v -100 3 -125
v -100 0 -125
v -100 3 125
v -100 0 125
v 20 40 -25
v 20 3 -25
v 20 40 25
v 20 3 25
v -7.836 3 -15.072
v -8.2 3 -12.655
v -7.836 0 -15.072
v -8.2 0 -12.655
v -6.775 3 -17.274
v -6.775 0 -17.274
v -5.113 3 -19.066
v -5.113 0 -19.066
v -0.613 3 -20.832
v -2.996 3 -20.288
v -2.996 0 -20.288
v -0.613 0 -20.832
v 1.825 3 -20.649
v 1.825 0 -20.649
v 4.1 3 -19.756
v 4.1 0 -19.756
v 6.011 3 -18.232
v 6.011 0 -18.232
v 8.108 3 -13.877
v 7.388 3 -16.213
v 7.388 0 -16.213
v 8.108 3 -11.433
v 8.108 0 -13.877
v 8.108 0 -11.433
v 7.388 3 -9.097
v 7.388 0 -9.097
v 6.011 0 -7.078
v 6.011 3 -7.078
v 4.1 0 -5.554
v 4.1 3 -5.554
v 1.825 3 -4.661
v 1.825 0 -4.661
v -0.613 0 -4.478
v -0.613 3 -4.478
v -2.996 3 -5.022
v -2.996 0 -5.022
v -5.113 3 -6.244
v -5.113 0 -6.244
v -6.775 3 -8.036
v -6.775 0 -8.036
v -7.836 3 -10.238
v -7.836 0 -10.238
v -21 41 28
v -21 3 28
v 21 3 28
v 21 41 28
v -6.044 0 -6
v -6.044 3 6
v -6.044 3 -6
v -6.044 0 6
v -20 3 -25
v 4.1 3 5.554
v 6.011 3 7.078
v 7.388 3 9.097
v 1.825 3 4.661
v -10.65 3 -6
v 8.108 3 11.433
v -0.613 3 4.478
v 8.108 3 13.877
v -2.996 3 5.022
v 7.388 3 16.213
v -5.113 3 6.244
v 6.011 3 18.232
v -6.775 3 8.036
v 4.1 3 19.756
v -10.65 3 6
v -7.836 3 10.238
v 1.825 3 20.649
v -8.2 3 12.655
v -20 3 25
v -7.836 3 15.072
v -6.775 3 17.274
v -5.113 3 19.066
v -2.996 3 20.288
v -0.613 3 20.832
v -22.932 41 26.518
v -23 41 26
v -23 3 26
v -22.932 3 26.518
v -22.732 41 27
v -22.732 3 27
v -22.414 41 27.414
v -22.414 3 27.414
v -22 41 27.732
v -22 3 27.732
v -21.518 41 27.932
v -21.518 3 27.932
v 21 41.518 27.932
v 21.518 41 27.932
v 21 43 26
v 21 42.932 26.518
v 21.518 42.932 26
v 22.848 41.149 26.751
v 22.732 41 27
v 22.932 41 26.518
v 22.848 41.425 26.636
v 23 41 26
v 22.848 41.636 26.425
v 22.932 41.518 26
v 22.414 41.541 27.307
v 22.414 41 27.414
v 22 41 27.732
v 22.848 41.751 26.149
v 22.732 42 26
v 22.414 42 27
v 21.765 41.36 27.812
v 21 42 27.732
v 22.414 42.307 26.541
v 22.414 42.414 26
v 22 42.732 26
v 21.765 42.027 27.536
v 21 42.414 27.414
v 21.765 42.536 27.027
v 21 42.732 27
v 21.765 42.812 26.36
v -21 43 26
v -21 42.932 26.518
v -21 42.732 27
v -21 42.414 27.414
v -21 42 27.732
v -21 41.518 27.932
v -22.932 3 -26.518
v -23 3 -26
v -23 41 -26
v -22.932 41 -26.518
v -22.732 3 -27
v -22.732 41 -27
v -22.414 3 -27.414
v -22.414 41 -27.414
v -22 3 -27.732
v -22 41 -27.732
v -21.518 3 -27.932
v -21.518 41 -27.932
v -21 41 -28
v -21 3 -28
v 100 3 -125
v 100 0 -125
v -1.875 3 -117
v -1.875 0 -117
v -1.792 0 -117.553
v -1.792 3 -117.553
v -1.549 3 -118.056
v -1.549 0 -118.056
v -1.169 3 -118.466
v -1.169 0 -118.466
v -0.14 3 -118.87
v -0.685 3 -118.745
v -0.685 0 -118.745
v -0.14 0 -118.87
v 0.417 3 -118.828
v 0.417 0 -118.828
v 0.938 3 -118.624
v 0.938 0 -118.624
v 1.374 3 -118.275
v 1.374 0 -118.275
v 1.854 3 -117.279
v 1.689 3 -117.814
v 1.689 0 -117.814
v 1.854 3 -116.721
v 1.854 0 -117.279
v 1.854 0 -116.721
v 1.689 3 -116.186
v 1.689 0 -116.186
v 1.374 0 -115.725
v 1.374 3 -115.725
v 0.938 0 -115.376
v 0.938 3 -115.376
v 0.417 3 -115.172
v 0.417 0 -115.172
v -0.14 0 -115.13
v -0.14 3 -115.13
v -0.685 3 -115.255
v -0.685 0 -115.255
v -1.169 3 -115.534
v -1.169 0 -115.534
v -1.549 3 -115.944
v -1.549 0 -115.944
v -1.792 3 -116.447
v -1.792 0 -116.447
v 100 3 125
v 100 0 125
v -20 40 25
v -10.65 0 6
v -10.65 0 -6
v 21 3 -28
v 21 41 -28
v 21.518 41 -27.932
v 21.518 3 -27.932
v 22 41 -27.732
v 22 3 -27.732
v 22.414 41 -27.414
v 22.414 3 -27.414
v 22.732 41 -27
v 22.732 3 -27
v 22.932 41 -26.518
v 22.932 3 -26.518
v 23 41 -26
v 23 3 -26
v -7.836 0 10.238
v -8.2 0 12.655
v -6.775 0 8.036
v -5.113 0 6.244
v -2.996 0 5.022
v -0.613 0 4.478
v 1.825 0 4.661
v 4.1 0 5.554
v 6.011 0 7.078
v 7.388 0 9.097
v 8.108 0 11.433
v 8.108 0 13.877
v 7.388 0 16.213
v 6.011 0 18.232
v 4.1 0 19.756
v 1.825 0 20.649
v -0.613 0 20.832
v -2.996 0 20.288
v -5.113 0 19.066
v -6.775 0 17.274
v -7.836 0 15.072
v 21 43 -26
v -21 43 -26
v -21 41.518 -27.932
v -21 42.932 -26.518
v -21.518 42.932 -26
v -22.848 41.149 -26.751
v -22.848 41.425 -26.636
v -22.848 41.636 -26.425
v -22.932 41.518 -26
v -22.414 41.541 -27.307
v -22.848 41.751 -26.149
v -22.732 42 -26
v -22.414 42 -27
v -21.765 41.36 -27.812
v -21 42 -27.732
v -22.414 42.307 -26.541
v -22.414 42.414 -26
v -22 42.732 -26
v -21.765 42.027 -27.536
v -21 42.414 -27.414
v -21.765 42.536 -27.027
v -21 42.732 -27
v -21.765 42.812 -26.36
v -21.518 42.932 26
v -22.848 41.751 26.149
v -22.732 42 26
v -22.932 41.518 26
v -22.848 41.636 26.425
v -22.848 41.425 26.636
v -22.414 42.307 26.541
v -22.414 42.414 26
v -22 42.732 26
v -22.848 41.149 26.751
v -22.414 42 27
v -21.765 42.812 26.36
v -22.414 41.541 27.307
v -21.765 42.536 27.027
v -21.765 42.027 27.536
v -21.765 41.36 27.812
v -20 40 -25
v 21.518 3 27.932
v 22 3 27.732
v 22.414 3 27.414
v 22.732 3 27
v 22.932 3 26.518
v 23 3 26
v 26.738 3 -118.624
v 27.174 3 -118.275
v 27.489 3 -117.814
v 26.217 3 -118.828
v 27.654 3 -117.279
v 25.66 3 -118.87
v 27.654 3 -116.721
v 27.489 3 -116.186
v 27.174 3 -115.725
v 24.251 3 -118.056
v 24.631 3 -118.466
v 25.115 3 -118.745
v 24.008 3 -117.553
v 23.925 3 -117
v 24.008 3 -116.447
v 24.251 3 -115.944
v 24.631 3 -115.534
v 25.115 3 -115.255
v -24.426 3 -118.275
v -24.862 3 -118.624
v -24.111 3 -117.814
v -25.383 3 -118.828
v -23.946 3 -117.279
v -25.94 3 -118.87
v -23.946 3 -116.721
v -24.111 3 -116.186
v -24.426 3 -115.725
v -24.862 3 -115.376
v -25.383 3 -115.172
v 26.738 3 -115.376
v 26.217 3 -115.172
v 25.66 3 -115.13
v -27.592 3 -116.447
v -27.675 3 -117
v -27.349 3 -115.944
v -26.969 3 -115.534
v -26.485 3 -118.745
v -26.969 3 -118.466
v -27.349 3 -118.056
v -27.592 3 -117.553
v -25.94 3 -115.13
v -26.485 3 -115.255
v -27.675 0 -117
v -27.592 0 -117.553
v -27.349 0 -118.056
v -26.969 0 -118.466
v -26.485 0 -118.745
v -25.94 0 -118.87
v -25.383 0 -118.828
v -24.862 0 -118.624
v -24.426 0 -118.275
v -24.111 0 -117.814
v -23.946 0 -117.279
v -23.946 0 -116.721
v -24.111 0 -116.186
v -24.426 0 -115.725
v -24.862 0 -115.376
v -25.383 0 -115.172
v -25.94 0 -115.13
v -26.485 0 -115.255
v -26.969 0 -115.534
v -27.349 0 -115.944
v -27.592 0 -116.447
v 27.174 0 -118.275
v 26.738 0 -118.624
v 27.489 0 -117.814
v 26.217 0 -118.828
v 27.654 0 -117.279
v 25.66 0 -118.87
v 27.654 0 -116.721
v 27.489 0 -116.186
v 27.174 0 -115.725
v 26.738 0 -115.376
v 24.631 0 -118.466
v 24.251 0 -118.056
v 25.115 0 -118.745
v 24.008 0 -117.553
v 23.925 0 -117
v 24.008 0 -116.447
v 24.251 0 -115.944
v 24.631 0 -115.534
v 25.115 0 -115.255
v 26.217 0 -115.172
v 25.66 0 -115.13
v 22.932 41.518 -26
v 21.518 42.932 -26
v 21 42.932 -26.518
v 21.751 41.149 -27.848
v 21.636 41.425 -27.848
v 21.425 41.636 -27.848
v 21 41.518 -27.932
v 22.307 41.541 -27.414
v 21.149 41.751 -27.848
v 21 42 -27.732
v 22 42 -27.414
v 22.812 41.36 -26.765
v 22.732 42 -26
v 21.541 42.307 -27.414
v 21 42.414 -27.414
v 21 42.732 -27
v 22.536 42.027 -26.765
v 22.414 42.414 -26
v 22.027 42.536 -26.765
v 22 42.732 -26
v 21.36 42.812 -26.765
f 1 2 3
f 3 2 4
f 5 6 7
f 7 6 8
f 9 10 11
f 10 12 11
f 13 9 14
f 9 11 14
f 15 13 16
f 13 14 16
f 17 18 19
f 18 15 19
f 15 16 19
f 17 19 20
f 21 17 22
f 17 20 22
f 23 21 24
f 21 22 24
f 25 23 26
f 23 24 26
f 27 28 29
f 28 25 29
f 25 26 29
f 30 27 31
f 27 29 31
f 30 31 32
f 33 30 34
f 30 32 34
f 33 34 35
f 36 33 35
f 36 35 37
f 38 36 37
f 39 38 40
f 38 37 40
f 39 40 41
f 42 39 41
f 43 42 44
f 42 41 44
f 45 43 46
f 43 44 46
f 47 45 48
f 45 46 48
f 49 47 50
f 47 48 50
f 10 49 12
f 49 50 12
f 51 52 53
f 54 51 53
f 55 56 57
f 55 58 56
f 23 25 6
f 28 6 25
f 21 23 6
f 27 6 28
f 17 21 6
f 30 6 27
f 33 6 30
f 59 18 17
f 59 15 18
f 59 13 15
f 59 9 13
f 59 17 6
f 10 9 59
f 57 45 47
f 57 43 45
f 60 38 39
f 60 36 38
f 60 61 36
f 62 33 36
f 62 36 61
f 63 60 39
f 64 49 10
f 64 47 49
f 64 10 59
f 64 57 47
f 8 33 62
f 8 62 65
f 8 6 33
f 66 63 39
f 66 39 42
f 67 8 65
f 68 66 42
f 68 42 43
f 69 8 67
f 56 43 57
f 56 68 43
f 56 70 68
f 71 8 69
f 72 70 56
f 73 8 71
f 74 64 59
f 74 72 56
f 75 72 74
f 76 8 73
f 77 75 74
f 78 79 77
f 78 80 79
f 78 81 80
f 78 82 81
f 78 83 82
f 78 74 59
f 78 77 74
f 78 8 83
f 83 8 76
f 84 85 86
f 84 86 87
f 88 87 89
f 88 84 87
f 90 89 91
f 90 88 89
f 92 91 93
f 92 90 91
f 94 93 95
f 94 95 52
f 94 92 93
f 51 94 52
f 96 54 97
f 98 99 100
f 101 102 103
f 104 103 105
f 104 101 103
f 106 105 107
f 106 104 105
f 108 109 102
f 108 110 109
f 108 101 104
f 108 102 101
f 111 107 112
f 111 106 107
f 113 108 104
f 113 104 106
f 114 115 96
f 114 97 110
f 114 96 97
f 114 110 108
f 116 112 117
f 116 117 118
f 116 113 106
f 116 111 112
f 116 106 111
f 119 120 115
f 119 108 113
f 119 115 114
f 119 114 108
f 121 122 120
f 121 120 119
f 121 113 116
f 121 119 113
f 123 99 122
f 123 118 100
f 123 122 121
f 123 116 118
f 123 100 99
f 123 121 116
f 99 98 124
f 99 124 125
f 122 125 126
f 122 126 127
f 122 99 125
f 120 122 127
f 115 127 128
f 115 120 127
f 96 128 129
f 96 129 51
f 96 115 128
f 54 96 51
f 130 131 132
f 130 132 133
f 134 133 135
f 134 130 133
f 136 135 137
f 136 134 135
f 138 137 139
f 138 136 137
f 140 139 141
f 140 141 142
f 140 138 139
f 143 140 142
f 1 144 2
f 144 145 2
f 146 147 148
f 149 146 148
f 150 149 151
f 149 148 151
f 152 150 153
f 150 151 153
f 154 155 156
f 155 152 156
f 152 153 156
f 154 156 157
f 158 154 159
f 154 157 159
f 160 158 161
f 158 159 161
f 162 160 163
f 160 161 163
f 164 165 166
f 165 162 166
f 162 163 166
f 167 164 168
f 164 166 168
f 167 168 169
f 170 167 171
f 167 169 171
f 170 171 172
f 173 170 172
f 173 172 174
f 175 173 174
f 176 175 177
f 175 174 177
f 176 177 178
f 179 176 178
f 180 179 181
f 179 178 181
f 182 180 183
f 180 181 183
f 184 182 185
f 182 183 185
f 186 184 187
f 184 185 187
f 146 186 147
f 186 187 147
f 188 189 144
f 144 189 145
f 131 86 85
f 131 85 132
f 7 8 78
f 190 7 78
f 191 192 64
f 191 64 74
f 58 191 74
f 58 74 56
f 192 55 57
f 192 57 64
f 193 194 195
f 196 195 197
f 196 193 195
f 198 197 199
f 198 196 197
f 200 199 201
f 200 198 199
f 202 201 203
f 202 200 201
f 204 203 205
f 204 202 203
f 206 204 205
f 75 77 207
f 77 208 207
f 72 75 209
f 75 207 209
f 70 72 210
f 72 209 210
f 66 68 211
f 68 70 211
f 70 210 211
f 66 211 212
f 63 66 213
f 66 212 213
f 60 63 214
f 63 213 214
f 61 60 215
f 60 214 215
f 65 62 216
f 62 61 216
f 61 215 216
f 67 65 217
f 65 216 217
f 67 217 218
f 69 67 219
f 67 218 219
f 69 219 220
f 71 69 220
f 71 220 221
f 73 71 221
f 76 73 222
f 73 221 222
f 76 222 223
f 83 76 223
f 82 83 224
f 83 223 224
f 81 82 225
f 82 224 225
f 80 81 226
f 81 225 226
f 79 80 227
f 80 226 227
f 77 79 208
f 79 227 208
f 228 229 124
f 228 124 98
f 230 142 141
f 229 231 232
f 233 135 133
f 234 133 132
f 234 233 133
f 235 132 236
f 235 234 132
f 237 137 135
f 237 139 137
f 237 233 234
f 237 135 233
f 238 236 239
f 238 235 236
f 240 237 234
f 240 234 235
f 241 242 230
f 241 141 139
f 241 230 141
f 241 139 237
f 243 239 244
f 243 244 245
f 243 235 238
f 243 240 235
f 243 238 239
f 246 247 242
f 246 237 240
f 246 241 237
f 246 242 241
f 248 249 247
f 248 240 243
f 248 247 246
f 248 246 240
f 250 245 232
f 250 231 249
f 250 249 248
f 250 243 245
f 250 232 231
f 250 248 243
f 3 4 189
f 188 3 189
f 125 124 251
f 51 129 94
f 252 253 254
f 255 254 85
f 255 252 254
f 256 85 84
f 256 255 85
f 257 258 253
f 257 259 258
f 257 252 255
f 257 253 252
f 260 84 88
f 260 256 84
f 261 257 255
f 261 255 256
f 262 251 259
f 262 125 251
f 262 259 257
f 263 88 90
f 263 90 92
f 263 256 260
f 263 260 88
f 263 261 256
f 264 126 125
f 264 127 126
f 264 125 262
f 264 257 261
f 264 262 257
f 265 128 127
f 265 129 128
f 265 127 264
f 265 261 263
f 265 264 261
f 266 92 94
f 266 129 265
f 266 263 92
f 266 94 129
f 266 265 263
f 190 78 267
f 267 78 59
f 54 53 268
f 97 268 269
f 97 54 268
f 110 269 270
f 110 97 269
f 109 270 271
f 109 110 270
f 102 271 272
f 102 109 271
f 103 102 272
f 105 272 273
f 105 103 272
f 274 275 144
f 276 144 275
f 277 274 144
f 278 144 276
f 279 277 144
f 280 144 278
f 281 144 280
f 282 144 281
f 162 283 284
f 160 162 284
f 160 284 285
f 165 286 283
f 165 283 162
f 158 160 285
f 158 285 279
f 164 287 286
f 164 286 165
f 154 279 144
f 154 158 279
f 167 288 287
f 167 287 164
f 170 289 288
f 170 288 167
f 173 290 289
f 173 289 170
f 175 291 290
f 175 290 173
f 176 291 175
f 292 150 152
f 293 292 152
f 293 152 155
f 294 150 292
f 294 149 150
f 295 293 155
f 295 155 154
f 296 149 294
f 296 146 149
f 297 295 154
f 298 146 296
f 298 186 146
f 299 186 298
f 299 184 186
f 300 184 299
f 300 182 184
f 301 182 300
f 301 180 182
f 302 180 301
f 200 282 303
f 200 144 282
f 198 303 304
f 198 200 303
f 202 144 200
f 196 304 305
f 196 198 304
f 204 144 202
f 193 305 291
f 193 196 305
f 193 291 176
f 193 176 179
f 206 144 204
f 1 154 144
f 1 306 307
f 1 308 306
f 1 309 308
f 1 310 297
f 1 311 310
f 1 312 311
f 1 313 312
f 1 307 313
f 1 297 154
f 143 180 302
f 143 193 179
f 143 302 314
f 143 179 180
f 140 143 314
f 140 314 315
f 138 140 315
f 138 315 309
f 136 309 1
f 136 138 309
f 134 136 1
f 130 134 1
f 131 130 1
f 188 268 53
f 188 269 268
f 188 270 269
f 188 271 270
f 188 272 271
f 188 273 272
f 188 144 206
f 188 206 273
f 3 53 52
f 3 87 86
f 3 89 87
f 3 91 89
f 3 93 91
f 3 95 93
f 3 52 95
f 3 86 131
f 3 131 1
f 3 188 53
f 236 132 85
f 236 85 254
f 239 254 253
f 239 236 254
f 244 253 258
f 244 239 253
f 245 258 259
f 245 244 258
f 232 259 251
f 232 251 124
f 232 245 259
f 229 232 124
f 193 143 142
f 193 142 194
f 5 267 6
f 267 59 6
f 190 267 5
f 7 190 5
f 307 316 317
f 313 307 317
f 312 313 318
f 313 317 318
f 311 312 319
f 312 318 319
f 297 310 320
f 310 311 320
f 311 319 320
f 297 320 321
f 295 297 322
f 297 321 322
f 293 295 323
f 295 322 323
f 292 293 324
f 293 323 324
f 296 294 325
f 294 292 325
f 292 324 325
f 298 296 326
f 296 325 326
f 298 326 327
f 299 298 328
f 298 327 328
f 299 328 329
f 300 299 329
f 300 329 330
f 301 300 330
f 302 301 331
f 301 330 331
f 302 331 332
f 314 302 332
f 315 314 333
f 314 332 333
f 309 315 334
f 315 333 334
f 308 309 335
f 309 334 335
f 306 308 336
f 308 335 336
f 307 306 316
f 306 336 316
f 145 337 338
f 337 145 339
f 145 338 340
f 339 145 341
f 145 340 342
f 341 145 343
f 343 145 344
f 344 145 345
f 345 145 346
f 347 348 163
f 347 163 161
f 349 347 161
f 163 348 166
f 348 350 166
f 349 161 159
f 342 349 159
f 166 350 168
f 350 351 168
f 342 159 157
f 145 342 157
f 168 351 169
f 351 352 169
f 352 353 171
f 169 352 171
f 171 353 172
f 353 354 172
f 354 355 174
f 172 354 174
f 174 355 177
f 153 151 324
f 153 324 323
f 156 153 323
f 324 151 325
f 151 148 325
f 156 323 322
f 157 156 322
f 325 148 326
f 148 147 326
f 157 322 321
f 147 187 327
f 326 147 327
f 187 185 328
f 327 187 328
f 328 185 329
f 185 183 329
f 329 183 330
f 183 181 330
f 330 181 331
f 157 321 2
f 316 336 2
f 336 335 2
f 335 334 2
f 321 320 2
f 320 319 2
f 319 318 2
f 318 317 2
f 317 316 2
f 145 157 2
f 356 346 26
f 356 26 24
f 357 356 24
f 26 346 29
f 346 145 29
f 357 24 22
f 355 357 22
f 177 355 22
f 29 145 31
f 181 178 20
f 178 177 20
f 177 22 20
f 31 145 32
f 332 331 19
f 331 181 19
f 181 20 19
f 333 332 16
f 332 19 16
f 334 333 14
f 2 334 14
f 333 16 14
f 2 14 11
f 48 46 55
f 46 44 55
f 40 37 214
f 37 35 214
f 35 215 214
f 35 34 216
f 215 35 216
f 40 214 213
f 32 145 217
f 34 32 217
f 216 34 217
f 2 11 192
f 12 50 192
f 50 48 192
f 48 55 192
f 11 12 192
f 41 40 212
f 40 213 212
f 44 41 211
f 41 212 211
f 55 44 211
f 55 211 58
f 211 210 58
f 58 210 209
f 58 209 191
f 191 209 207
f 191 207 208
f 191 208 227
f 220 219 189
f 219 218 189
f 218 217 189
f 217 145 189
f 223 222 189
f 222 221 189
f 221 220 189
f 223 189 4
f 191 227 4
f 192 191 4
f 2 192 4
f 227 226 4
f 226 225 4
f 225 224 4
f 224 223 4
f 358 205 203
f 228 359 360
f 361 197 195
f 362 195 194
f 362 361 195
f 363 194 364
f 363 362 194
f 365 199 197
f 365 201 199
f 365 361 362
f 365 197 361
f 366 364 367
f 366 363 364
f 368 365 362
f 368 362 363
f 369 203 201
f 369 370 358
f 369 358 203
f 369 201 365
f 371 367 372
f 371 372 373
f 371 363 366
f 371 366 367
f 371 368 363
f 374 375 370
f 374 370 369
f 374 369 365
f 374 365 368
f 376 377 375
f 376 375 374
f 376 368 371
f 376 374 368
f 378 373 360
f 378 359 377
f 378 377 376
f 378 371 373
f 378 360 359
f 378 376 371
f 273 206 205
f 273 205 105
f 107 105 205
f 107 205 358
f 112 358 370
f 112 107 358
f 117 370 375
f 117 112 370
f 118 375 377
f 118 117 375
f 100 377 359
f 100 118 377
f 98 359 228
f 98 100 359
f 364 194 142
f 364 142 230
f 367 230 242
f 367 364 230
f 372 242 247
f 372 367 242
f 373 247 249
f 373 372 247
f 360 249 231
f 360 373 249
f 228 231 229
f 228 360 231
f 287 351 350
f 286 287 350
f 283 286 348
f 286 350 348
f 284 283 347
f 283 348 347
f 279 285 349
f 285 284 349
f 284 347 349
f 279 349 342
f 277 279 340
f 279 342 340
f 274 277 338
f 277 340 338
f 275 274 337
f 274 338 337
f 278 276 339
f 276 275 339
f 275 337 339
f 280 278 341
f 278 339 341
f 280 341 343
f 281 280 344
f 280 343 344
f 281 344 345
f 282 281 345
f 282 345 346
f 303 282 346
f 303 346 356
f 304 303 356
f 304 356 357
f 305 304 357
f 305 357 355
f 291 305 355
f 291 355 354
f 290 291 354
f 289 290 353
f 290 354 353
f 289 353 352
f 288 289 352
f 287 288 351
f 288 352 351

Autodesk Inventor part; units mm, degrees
ref_plane "YZ Plane" through (0, 0, 0) normal (1, 0, 0) x (0, 1, 0)
ref_plane "XZ Plane" through (0, 0, 0) normal (0, 1, 0) x (-1, 0, 0)
ref_plane "XY Plane" through (0, 0, 0) normal (0, 0, 1) x (1, 0, 0)
sketch "Sketch1" plane through (0, 0, 0) normal (0, 1, 0) x (-1, 0, 0)
  line L0 (100, 125) -> (-100, 125)
  line L1 (-100, 125) -> (-100, -125)
  line L2 (-100, -125) -> (100, -125)
  line L3 (100, -125) -> (100, 125)
  line L4 (100, 125) -> (-100, -125) construction
  line L5 (-100, 125) -> (100, -125) construction
  circle A0 centre (0, 12.655) radius 8.2
  circle A1 centre (0, -12.655) radius 8.2
  line L6 (10.65, 6) -> (6.0435, 6)
  line L7 (6.0435, 6) -> (6.0435, -6)
  line L8 (6.0435, -6) -> (10.65, -6)
  line L9 (10.65, -6) -> (10.65, 6)
  line L10 (10.65, 6) -> (6.0435, -6) construction
  line L11 (6.0435, 6) -> (10.65, -6) construction
  circle A2 centre (0, -117) radius 1.875
  circle A3 centre (-25.8, -117) radius 1.875
  circle A4 centre (25.8, -117) radius 1.875
  point P0 (0, 0)
  dimension "d0" = 200
  dimension "d1" = 250
  dimension "d2" = 16.4
  dimension "d3" = 16.4
  dimension "d7" = 4.6065
  dimension "d8" = 12
  dimension "d14" = 3.75
  dimension "d15" = 3.75
  dimension "d16" = 3.75
  dimension "d17" = 8
  dimension "d18" = 8
  dimension "d19" = 8
  dimension "d20" = 25.8
  dimension "d21" = 25.8
extrude "Extrusion1" add sketch "Sketch1" along normal blind 3
sketch "Sketch2" plane through (0, 3, 0) normal (0, 1, 0) x (1, 0, 0)
  line L0 (-20, 25) -> (20, 25)
  line L1 (20, 25) -> (20, -25)
  line L2 (20, -25) -> (-20, -25)
  line L3 (-20, -25) -> (-20, 25)
  line L4 (-20, 25) -> (20, -25) construction
  line L5 (20, 25) -> (-20, -25) construction
  line L6 (-23, 28) -> (23, 28)
  line L7 (23, 28) -> (23, -28)
  line L8 (23, -28) -> (-23, -28)
  line L9 (-23, -28) -> (-23, 28)
  line L10 (-23, 28) -> (23, -28) construction
  line L11 (23, 28) -> (-23, -28) construction
  point P0 (0, 0)
  dimension "d24" = 40
  dimension "d25" = 50
  dimension "d26" = 46
  dimension "d27" = 56
extrude "Extrusion2" add sketch "Sketch2" along normal blind 37
sketch "Sketch3" plane through (0, 40, 0) normal (0, 1, 0) x (1, 0, 0)
  line L0 (-23, -28) -> (23, -28) projected
  line L1 (-23, 28) -> (23, 28)
  line L2 (23, 28) -> (23, -28)
  line L3 (23, -28) -> (-23, -28)
  line L4 (-23, -28) -> (-23, 28)
  line L5 (-23, 28) -> (23, -28) construction
  line L6 (23, 28) -> (-23, -28) construction
  point P0 (0, 0)
extrude "Extrusion3" add sketch "Sketch3" along normal blind 3
fillet "Fillet1" radius 2 8 edges at (0, 43, 28) (23, 43, 0) (0, 43, -28) (-23, 43, 0) (-23, 23, 28) (23, 23, 28) (23, 23, -28) (-23, 23, -28)
properties part number "top_sensor"
